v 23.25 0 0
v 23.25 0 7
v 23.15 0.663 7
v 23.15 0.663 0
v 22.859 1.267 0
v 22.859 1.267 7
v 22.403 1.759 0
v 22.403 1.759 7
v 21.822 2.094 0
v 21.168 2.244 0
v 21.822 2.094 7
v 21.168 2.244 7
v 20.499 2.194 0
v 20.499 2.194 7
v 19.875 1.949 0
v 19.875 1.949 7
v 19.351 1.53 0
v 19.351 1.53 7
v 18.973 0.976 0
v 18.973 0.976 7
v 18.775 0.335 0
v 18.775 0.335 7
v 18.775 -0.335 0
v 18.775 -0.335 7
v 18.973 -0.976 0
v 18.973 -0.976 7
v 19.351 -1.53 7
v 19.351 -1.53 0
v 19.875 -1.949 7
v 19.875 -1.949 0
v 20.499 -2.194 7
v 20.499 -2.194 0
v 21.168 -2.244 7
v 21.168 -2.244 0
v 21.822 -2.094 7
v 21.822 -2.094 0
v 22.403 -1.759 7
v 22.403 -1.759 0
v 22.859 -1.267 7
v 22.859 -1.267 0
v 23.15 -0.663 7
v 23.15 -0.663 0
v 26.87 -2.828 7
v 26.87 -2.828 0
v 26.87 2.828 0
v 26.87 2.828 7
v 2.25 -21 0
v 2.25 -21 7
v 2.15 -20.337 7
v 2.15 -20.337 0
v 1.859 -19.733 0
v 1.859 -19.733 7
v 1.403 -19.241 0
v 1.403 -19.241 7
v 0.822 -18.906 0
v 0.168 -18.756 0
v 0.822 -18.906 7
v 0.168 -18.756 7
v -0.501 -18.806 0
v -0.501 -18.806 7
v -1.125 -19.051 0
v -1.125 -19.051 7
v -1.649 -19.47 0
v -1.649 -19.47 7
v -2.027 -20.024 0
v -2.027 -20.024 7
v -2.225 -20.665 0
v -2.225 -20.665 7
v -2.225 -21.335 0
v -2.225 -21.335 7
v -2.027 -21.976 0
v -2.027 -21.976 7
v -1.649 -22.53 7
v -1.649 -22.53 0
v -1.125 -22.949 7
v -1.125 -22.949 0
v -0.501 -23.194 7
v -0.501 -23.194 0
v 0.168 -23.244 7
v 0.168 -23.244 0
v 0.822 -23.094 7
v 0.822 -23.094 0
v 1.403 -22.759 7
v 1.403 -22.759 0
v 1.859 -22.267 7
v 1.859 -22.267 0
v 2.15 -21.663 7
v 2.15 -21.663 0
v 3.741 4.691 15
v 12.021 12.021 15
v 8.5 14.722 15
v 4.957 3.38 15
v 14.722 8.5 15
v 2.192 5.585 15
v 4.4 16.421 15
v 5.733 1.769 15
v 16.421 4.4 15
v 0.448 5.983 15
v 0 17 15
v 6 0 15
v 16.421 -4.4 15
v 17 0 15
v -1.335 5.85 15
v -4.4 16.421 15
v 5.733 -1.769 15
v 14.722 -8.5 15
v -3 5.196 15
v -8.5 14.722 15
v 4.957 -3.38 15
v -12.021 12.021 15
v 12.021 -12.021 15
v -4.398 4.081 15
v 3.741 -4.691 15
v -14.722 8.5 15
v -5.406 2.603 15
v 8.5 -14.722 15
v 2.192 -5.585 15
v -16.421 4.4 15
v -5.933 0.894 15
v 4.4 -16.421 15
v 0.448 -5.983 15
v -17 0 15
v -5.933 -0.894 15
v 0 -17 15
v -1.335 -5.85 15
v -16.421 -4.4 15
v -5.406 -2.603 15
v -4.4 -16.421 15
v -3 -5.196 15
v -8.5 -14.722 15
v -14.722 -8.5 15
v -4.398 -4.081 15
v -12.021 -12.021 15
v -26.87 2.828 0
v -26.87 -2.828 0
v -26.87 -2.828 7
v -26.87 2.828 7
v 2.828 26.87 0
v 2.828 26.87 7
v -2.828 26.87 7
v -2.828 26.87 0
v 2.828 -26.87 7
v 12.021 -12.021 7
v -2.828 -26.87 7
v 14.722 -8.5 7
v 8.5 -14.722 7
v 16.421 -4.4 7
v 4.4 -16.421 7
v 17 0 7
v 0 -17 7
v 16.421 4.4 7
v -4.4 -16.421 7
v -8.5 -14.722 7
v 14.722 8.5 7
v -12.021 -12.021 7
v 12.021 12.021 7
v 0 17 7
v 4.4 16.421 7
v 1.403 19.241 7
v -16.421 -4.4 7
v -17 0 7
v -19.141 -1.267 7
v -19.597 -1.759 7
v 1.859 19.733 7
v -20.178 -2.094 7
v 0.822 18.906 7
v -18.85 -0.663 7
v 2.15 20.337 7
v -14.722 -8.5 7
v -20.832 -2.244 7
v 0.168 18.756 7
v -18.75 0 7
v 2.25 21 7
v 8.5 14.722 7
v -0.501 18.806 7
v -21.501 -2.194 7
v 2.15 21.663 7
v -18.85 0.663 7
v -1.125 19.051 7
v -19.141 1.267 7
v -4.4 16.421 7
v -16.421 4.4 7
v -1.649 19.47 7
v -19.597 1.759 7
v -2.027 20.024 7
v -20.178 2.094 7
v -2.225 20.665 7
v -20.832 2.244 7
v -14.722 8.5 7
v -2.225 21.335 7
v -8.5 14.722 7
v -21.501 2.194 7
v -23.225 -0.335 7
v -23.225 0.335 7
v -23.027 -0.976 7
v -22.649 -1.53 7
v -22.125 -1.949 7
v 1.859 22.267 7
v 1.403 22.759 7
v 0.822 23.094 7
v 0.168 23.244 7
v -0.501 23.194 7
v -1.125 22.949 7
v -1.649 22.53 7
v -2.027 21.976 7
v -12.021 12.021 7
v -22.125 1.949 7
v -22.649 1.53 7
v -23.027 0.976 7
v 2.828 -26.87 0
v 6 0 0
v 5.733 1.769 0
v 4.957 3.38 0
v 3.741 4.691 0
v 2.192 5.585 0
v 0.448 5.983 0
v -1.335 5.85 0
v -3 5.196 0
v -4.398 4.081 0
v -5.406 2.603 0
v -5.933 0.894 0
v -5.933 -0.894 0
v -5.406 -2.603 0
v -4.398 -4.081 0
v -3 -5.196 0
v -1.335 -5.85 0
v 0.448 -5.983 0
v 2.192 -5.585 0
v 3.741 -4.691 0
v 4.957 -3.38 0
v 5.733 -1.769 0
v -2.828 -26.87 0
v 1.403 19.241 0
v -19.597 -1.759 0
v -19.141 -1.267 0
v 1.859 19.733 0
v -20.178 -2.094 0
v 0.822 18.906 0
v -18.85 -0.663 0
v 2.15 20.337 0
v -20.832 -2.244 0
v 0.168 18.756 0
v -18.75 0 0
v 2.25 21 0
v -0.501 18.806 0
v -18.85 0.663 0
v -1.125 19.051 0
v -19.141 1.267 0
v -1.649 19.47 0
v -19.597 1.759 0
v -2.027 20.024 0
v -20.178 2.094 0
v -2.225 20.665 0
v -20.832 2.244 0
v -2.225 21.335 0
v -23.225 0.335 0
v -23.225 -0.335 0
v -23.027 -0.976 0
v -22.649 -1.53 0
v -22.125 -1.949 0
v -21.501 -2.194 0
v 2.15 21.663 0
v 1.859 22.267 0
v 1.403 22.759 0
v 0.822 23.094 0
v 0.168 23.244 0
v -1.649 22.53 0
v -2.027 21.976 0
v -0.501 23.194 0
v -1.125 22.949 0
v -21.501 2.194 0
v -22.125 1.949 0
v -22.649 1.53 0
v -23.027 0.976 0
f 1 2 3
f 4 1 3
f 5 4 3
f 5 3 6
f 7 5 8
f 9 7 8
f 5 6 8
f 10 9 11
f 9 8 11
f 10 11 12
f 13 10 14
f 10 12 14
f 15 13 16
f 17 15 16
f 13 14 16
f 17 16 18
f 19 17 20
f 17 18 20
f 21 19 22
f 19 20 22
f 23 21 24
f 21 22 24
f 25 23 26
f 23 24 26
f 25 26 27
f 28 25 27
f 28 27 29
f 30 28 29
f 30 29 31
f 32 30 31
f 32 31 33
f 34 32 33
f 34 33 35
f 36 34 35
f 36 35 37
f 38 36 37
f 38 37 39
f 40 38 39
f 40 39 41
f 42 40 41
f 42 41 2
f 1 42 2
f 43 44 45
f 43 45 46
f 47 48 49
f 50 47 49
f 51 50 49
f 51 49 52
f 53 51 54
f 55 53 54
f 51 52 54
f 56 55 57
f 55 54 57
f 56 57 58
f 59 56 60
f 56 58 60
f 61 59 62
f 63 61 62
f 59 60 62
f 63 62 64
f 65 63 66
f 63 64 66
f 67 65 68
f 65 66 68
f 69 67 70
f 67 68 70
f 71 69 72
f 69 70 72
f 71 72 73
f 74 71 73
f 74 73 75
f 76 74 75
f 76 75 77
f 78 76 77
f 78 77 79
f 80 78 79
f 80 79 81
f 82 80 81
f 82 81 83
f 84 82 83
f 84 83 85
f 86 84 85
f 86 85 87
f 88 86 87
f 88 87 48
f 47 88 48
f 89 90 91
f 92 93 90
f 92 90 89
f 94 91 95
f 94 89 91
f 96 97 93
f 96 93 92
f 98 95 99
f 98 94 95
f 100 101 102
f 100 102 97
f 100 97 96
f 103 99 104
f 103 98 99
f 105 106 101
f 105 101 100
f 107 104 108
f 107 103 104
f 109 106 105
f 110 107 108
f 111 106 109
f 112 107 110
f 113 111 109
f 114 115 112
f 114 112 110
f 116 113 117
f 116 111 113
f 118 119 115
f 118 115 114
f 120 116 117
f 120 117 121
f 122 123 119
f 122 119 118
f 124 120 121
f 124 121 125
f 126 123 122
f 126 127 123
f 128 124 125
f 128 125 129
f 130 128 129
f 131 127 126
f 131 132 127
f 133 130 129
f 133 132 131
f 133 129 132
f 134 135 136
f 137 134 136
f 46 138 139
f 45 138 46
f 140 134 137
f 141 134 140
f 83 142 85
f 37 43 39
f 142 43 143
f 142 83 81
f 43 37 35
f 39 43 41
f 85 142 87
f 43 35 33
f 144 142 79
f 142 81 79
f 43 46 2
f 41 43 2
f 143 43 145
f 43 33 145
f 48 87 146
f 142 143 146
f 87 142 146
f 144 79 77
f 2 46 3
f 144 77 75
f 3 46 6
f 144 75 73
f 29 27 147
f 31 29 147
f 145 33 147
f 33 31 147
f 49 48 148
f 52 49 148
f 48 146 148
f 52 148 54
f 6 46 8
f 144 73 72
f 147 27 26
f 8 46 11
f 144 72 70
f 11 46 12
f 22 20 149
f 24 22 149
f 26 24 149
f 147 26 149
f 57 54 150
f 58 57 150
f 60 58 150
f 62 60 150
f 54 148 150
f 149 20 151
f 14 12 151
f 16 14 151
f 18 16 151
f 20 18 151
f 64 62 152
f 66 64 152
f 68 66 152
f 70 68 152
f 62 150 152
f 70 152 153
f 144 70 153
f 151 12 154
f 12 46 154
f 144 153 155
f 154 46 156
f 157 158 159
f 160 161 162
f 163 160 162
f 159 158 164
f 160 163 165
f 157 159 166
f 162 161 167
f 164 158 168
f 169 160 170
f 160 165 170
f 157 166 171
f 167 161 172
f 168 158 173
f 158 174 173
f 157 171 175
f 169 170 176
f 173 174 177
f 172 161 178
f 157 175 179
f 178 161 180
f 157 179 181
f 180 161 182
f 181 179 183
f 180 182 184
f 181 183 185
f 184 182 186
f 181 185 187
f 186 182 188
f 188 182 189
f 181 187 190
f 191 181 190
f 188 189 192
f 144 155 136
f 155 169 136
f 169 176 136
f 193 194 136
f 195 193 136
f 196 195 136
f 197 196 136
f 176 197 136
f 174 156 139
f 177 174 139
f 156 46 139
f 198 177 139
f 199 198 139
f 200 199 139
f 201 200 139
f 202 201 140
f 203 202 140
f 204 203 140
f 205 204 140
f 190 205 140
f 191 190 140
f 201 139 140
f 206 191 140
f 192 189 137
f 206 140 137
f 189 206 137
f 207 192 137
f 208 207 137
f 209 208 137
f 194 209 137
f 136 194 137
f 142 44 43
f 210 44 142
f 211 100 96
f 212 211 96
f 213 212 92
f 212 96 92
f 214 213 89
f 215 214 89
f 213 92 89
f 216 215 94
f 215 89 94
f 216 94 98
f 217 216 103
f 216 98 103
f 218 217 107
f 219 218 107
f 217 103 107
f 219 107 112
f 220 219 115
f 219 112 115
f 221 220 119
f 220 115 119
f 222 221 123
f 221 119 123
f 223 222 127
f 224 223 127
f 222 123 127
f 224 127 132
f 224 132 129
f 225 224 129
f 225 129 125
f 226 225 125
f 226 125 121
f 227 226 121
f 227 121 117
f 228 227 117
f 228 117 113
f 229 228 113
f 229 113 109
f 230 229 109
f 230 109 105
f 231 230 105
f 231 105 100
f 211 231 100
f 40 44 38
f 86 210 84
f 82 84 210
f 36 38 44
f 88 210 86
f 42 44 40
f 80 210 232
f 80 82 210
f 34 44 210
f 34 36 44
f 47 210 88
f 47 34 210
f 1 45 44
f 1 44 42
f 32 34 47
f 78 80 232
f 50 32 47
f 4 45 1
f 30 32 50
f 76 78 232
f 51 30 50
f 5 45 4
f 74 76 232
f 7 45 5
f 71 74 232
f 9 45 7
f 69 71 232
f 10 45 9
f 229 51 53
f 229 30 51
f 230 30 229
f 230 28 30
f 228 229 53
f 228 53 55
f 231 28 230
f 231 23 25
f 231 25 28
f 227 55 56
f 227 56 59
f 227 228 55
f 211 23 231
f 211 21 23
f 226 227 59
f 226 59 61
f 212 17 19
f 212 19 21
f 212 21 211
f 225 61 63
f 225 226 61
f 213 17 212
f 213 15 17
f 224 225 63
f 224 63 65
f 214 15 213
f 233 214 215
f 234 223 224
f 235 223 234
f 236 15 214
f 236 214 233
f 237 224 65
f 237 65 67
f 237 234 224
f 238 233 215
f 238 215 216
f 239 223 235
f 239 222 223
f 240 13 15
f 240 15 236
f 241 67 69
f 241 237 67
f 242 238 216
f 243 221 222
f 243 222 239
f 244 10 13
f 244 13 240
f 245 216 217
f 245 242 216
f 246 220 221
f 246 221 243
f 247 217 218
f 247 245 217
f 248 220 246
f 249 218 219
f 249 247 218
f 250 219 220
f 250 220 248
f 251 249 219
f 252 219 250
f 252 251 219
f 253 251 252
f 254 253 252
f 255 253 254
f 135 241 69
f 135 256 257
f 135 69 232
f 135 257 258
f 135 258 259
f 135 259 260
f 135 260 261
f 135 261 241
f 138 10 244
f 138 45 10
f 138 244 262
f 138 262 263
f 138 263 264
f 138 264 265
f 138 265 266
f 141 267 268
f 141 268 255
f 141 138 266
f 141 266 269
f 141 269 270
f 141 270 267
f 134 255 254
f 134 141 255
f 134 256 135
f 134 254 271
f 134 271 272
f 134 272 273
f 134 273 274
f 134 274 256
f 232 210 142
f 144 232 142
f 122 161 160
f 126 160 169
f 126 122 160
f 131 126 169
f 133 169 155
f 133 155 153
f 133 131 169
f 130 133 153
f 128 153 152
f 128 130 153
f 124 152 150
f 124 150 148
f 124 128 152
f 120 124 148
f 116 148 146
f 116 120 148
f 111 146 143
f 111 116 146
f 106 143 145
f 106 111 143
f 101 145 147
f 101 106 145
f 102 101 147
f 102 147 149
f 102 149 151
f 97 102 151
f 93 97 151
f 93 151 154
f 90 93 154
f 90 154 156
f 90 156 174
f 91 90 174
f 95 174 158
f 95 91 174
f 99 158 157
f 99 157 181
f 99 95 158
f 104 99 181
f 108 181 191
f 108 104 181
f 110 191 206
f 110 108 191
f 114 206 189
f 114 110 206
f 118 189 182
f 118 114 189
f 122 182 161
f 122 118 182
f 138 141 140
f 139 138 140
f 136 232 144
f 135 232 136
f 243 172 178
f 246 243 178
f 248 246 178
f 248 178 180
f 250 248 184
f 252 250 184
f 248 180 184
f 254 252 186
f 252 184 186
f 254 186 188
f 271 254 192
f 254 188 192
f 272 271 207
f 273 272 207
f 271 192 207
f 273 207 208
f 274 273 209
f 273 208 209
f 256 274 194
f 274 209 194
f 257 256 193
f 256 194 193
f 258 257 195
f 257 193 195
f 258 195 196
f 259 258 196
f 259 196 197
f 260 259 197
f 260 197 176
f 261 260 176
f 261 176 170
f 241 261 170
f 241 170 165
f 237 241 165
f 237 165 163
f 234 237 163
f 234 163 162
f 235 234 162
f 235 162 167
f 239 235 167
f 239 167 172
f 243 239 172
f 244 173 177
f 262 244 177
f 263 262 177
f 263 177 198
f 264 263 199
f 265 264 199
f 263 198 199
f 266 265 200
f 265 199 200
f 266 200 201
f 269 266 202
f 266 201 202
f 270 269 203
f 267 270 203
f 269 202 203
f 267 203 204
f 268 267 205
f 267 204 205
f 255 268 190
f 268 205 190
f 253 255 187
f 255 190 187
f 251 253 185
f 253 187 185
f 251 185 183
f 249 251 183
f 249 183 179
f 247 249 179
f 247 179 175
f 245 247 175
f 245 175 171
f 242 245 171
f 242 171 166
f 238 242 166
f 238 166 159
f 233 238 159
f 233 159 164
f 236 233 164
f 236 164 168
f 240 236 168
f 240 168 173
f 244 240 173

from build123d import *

# Parameters (mm, degrees)
EXTRUSION1_DEPTH = 7
SKETCH2_R        = 2.25
EXTRUSION2_DEPTH = 20
SKETCH3_R        = 6
EXTRUSION3_DEPTH = 20
EXTRUSION4_START = 8
SKETCH4_R        = 17
SKETCH4_R_2      = 6
EXTRUSION4_DEPTH = 8
CHAMFER1_SIZE    = 4
CHAMFER2_SIZE    = 4
CHAMFER3_SIZE    = 4
CHAMFER4_SIZE    = 4


with BuildPart() as part:
    # Sketch1 → Extrusion1 (new body)
    with BuildSketch(Plane.XY):
        Polygon((-29.69848481, 0), (0, 29.69848481), (29.69848481, 0), (0, -29.69848481), align=None)
    extrude(amount=EXTRUSION1_DEPTH)

    # Sketch2 → Extrusion2 (cut)
    with BuildSketch(Plane.XY.offset(7)):
        with Locations((0, 21)):
            Circle(SKETCH2_R)
        with Locations((21, 0)):
            Circle(SKETCH2_R)
        with Locations((0, -21)):
            Circle(SKETCH2_R)
        with Locations((-21, 0)):
            Circle(SKETCH2_R)
    extrude(amount=-EXTRUSION2_DEPTH, mode=Mode.SUBTRACT)

    # Sketch3 → Extrusion3 (cut)
    with BuildSketch(Plane.XY.offset(7)):
        Circle(SKETCH3_R)
    extrude(amount=-EXTRUSION3_DEPTH, mode=Mode.SUBTRACT)

    # Sketch4 → Extrusion4 (add)
    with BuildSketch(Plane.XY.offset(7).offset(EXTRUSION4_START)):
        with Locations(Location((0, 0, 0), (0, 0, 180))):
            Circle(SKETCH4_R)
        Circle(SKETCH4_R_2, mode=Mode.SUBTRACT)
    extrude(amount=-EXTRUSION4_DEPTH)

    # Chamfer1
    chamfer1_edges = [part.edges().sort_by_distance(p)[0] for p in [
        (0, 29.69848481, 3.5),
    ]]
    chamfer(chamfer1_edges, length=CHAMFER1_SIZE)

    # Chamfer2
    chamfer2_edges = [part.edges().sort_by_distance(p)[0] for p in [
        (29.69848481, 0, 3.5),
    ]]
    chamfer(chamfer2_edges, length=CHAMFER2_SIZE)

    # Chamfer3
    chamfer3_edges = [part.edges().sort_by_distance(p)[0] for p in [
        (-29.69848481, 0, 3.5),
    ]]
    chamfer(chamfer3_edges, length=CHAMFER3_SIZE)

    # Chamfer4
    chamfer4_edges = [part.edges().sort_by_distance(p)[0] for p in [
        (0, -29.69848481, 3.5),
    ]]
    chamfer(chamfer4_edges, length=CHAMFER4_SIZE)


solid = part.part
